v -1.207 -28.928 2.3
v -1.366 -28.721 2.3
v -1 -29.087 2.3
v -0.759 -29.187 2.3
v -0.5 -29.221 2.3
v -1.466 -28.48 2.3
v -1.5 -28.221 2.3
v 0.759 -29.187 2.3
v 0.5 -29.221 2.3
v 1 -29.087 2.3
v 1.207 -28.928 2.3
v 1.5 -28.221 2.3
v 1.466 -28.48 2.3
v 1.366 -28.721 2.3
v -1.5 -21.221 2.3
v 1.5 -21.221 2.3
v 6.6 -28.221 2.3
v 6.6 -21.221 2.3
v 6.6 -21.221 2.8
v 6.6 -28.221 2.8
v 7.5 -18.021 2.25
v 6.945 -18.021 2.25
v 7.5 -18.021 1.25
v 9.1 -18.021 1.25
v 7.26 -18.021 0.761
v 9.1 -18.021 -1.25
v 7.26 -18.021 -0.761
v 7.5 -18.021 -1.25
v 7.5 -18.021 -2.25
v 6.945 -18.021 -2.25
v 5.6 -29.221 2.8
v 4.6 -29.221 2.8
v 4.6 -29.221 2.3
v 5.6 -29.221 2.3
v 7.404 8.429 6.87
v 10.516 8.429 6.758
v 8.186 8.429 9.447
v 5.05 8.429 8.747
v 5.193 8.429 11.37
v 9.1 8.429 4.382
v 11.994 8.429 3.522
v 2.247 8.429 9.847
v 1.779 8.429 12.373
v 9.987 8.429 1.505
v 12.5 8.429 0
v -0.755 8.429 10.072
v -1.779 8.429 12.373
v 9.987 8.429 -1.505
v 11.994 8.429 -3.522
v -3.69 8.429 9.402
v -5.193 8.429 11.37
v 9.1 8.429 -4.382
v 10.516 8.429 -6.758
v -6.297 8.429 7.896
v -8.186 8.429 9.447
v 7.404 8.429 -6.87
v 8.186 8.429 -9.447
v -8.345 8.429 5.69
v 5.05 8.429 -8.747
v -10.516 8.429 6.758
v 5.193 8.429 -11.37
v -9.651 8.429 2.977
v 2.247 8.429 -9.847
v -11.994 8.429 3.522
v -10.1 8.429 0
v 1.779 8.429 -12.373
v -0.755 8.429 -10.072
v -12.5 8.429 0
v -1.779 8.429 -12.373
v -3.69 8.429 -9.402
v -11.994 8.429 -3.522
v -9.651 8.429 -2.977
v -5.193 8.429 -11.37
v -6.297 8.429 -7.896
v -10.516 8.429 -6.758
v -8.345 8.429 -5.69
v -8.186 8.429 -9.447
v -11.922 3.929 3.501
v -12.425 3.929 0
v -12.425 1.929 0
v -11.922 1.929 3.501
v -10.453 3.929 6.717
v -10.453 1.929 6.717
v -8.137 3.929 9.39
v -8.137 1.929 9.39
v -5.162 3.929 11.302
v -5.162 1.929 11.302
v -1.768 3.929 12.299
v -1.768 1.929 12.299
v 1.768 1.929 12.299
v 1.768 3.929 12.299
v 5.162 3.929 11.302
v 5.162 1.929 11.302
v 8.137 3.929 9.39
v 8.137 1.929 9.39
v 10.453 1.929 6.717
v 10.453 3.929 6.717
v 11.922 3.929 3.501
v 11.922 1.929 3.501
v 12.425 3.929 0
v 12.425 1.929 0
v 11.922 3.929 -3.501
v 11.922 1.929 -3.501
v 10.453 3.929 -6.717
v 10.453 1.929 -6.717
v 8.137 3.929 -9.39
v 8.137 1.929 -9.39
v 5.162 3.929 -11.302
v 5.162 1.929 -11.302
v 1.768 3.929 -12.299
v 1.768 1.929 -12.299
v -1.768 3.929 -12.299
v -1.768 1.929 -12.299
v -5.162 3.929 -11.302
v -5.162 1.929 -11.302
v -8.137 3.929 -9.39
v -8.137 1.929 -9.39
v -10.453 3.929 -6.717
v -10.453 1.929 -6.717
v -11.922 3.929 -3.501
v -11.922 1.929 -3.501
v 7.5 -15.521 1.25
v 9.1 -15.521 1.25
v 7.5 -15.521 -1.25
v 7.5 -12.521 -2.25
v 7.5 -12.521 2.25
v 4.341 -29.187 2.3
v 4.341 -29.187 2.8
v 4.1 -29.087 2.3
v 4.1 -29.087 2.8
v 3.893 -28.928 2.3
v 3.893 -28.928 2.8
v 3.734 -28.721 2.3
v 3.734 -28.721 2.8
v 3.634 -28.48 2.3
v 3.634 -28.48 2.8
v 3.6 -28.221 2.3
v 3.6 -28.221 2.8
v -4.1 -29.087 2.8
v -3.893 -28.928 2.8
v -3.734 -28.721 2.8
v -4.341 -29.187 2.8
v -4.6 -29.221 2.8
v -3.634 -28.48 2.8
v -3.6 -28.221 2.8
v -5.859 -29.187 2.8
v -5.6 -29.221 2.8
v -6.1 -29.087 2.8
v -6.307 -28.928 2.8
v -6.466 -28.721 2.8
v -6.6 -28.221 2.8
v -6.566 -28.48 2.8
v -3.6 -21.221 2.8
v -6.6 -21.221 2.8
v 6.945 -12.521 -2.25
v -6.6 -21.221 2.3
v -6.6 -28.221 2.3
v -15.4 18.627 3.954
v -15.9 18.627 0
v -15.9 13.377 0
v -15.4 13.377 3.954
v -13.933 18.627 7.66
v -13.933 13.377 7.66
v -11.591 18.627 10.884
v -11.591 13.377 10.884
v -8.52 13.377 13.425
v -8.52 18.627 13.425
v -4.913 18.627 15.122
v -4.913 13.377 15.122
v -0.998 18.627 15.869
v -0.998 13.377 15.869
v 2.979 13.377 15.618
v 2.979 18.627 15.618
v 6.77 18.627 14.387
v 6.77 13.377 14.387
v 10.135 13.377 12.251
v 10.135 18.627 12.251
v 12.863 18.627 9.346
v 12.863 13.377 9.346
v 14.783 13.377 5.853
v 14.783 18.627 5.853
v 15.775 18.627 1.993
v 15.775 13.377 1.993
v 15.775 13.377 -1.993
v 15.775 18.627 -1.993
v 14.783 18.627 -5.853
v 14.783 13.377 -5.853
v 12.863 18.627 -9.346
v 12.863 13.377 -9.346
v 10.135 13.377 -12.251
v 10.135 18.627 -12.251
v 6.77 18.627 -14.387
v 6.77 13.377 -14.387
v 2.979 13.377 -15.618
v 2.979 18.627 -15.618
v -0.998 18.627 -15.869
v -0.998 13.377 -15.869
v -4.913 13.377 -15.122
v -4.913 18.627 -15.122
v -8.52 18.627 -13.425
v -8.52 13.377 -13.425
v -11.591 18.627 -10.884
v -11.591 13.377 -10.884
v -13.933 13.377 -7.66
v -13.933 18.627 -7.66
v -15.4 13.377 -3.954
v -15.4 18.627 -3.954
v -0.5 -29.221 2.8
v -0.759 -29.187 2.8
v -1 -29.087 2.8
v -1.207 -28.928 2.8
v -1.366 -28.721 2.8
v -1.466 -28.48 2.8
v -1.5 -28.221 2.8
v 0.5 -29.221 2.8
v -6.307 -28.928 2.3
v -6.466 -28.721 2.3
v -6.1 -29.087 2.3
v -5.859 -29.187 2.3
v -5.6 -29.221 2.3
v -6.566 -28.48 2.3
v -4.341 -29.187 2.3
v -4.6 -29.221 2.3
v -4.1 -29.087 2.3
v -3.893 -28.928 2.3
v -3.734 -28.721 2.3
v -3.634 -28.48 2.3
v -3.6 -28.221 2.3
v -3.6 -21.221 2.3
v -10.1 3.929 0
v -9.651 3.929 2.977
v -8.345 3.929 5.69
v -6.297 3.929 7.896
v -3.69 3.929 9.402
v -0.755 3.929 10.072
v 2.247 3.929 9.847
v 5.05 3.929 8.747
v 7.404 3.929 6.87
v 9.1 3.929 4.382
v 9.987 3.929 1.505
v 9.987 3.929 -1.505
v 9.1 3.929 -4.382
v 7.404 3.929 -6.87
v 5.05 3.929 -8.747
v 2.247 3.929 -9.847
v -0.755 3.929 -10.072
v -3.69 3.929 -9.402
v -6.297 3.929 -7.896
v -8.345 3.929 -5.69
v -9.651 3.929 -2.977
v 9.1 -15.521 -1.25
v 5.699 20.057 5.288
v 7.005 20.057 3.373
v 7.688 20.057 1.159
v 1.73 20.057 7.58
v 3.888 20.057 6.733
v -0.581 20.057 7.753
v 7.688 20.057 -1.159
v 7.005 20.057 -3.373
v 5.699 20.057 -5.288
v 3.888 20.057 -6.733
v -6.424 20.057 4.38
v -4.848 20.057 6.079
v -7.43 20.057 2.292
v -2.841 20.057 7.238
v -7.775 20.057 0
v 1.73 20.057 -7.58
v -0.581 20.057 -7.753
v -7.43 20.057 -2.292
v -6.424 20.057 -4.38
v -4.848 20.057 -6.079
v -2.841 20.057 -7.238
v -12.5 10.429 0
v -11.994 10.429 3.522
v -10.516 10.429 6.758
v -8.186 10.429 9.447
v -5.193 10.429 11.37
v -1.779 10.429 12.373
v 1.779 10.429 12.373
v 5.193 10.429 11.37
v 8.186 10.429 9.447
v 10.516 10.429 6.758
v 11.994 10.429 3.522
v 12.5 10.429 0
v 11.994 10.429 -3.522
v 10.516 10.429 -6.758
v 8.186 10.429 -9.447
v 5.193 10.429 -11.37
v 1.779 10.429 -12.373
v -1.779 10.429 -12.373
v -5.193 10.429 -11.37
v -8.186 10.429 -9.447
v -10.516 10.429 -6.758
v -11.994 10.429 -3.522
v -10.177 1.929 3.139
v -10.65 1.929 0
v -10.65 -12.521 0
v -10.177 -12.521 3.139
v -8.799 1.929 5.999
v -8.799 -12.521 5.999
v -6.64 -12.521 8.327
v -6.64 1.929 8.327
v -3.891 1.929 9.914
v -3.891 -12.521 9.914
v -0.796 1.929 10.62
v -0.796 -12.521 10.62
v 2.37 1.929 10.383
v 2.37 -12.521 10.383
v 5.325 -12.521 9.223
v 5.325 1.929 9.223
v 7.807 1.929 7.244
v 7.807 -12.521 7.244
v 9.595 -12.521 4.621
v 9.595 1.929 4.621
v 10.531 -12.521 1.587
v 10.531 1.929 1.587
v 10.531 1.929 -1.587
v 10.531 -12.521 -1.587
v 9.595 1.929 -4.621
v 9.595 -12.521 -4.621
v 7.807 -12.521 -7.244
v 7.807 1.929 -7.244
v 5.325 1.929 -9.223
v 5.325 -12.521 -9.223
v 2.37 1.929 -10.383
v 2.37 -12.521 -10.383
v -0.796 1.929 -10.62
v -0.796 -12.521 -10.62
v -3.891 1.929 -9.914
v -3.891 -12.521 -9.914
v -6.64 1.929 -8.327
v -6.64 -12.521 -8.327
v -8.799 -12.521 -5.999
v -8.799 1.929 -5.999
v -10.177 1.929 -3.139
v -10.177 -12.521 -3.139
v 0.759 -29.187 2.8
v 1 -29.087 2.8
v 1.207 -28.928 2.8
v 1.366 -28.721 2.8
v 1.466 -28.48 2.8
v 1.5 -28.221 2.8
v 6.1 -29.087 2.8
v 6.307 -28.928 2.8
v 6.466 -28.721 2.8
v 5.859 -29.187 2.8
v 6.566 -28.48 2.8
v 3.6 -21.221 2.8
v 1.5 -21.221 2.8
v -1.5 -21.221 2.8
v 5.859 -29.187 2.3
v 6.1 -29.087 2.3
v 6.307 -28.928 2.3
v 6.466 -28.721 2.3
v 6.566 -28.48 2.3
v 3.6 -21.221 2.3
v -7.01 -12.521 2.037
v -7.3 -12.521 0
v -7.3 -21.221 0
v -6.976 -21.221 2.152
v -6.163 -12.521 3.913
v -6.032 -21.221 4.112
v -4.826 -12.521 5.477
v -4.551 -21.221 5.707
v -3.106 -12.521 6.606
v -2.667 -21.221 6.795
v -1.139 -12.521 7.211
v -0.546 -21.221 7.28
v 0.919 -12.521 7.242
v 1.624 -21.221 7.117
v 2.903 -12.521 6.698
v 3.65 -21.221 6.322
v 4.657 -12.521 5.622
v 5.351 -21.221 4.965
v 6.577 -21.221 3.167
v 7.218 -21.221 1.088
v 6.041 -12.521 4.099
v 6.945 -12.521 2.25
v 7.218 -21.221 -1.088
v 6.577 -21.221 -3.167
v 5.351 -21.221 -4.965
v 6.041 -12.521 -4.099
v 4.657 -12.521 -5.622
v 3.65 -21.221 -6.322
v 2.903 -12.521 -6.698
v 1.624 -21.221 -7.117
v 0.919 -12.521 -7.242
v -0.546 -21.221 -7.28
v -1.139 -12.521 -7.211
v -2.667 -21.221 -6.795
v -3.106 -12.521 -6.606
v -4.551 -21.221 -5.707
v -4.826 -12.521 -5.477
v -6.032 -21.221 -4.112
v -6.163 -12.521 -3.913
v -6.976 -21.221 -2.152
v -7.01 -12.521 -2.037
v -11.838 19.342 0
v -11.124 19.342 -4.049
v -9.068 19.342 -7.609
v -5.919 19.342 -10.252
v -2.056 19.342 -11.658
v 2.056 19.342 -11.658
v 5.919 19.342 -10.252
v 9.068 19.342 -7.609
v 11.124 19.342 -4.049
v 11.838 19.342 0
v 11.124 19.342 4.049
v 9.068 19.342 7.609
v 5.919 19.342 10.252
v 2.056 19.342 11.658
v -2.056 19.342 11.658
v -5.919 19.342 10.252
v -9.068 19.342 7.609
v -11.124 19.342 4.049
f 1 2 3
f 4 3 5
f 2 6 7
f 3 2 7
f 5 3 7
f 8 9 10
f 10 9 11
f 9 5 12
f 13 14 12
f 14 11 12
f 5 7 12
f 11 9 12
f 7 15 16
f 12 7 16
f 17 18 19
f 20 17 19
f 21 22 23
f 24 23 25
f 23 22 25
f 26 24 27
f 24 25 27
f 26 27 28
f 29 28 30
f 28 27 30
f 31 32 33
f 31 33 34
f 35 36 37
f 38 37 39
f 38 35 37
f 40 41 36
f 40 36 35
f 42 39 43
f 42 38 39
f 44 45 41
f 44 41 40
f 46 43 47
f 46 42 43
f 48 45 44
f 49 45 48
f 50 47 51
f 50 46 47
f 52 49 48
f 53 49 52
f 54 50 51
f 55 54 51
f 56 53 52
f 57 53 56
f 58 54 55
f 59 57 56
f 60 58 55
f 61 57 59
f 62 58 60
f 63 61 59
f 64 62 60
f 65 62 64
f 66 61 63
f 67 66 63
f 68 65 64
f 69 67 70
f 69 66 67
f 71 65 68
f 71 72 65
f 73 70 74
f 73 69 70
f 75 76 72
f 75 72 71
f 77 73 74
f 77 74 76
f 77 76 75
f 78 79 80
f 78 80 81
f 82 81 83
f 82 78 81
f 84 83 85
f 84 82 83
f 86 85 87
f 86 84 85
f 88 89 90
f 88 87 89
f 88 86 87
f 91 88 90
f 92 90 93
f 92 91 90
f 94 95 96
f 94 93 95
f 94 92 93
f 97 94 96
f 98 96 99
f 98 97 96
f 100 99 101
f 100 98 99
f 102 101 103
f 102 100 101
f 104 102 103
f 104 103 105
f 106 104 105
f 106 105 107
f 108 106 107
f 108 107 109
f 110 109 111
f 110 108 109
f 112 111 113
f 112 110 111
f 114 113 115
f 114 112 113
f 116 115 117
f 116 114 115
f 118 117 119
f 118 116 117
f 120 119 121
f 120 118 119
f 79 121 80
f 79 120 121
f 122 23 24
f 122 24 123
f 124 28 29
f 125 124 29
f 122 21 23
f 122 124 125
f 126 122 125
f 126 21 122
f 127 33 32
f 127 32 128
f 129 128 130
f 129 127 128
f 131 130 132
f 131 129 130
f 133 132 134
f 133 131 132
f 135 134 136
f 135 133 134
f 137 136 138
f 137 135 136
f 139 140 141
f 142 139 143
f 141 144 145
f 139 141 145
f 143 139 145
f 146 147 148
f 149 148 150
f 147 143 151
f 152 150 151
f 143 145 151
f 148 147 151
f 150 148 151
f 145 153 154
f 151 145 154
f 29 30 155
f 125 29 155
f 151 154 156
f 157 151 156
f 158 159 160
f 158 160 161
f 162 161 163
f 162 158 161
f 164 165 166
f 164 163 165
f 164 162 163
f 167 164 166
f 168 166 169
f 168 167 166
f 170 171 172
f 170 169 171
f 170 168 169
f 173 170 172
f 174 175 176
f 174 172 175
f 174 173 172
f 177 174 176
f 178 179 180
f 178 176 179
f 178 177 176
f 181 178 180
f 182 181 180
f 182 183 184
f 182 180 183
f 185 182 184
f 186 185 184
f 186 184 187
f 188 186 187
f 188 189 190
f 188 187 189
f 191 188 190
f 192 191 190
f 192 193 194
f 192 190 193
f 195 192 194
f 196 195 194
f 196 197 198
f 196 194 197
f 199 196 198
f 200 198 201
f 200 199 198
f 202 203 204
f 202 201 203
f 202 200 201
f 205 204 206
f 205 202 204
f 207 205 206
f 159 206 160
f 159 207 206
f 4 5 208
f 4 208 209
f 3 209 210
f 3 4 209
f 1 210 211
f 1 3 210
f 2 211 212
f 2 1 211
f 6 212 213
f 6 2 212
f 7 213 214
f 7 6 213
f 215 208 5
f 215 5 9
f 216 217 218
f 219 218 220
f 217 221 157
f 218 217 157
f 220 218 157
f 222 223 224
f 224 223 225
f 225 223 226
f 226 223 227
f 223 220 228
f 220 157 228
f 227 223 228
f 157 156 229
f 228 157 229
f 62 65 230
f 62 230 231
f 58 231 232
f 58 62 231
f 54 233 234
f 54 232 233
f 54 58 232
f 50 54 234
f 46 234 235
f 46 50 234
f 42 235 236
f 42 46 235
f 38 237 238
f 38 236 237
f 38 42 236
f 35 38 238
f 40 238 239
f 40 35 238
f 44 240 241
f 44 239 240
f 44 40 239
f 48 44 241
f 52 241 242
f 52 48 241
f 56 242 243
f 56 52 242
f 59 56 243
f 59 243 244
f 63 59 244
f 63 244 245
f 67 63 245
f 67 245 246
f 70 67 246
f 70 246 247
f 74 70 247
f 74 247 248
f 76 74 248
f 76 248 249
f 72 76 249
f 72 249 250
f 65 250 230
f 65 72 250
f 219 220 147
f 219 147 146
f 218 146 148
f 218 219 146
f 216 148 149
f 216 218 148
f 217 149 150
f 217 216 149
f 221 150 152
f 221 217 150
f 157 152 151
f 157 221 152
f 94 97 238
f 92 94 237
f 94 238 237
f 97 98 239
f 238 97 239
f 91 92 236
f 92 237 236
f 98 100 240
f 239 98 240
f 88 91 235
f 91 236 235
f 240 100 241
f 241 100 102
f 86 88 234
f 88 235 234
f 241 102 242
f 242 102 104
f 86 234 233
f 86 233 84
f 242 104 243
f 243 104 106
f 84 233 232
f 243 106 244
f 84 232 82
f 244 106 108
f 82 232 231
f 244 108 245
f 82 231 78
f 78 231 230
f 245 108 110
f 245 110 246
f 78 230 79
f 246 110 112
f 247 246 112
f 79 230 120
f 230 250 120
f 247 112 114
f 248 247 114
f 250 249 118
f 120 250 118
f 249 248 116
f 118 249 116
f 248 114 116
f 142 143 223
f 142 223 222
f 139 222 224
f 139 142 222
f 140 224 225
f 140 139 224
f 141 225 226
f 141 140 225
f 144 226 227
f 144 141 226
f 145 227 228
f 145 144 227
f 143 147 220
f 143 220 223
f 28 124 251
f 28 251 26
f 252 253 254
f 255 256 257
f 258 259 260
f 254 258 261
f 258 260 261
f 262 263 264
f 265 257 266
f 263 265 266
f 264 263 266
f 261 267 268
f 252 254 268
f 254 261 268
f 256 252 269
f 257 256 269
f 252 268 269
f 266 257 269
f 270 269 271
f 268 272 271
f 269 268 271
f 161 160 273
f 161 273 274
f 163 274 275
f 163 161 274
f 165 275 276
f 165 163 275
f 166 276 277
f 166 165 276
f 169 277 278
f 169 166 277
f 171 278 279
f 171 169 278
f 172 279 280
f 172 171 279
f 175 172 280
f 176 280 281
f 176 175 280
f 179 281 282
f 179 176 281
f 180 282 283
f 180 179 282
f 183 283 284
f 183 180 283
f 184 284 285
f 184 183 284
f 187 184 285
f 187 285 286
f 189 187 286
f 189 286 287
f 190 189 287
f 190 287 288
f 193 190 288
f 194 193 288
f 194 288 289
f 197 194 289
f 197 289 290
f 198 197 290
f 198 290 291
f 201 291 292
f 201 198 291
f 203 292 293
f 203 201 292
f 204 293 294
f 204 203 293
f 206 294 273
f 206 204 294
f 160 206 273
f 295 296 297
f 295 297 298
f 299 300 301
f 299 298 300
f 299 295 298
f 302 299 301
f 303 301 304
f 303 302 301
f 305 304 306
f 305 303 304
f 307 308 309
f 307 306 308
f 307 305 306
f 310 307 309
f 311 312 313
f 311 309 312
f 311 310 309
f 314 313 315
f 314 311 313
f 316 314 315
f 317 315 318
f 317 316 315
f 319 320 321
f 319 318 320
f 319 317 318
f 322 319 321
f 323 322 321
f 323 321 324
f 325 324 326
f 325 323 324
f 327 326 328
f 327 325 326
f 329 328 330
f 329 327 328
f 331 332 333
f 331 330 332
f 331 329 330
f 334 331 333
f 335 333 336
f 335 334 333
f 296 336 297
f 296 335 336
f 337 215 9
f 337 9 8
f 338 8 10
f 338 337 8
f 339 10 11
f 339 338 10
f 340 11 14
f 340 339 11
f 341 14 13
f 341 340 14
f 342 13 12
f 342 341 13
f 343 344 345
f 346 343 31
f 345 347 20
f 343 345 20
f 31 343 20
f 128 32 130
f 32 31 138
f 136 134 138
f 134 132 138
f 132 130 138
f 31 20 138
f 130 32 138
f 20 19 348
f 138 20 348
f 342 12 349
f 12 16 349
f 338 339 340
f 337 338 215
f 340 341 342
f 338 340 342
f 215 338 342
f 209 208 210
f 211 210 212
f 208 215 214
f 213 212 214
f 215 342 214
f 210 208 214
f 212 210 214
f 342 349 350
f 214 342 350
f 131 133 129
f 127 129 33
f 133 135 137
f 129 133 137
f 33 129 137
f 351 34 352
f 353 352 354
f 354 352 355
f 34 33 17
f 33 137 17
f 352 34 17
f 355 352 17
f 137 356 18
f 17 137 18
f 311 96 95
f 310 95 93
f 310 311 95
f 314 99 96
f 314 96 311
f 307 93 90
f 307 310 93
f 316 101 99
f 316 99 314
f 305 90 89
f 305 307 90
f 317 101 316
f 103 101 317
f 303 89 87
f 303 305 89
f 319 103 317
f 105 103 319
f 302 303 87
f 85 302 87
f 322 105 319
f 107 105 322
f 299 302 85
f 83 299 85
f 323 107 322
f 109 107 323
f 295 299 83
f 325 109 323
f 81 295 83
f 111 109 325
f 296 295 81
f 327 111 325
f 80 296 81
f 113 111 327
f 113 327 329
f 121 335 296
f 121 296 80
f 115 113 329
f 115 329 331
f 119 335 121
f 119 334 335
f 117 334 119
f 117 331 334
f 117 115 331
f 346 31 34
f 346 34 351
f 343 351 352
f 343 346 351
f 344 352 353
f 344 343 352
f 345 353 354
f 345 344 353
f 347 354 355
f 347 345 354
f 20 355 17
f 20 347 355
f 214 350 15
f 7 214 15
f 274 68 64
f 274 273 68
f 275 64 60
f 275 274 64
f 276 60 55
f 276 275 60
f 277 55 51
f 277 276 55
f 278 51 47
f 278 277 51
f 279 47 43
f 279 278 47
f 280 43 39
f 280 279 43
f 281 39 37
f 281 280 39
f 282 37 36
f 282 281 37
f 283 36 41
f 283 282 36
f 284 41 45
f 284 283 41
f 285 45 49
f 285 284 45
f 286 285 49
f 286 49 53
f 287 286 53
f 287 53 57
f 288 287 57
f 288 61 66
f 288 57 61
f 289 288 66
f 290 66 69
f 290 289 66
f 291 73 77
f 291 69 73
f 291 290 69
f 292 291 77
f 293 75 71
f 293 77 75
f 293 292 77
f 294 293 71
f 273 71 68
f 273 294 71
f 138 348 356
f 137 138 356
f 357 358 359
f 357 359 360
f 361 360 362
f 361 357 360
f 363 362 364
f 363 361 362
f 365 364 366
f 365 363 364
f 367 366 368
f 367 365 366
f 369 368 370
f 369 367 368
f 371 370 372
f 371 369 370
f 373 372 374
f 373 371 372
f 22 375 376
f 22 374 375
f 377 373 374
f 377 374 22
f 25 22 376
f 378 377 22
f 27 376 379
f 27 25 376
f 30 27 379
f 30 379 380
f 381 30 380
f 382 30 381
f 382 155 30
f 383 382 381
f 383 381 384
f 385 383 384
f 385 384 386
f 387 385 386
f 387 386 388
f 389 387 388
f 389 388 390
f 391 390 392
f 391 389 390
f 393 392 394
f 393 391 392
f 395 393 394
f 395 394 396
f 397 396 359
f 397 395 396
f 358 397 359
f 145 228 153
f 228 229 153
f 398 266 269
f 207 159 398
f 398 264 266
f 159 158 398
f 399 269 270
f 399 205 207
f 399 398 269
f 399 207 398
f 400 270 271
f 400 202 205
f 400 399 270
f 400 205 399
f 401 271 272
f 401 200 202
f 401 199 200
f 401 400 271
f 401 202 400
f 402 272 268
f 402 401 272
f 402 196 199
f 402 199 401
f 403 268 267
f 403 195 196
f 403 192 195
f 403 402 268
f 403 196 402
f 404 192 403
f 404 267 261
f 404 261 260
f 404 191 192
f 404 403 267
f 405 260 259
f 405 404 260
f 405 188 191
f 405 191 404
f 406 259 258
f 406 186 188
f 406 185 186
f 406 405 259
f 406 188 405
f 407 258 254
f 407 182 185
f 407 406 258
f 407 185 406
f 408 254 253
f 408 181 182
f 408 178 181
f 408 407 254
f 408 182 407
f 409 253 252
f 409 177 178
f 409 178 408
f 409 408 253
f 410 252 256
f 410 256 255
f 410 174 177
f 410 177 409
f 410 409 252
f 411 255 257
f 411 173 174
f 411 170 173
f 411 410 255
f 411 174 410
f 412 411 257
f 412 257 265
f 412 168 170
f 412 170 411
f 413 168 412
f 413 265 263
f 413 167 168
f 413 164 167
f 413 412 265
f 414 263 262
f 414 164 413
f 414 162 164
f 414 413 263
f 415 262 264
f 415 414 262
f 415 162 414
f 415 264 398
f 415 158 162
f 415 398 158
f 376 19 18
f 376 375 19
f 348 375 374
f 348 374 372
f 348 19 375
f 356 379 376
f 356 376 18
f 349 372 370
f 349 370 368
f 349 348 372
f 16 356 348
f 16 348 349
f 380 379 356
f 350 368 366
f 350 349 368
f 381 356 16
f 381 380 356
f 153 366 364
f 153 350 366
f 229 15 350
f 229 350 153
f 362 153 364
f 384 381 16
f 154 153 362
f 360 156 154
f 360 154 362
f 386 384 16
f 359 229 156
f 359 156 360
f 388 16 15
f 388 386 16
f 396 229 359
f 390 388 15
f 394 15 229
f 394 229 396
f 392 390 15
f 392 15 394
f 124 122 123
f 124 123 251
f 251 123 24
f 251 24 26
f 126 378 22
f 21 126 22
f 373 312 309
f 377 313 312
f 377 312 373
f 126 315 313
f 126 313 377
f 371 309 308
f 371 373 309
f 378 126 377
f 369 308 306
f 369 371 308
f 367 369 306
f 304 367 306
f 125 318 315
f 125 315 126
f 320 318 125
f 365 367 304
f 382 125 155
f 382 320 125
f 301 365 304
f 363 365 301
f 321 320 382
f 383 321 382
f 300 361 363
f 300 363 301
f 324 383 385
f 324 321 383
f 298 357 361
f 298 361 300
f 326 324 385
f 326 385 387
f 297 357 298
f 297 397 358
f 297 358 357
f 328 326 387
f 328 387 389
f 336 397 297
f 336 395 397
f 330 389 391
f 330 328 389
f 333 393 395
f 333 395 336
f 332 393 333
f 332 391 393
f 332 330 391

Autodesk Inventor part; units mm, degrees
ref_plane "XZ Plane" through (0, 0, 0) normal (0, 1, 0) x (-1, 0, 0)
ref_plane "XY Plane" through (0, 0, 0) normal (0, 0, 1) x (1, 0, 0)
sketch "Sketch1" plane through (0, 0, 0) normal (0, 0, 1) x (1, 0, 0)
  line L0 (0, 20.0573) -> (0, -21.2213)
  line L1 (0, -21.2213) -> (-7.3, -21.2213)
  line L2 (-7.3, -21.2213) -> (-7.3, -12.5213)
  line L3 (-7.3, -12.5213) -> (-10.65, -12.5213)
  line L4 (-10.65, 1.9287) -> (-12.425, 1.9287)
  line L5 (-12.425, 1.9287) -> (-12.425, 3.9287)
  line L6 (-12.425, 3.9287) -> (-10.1, 3.9287)
  line L7 (-10.1, 3.9287) -> (-10.1, 8.4287)
  line L8 (-10.1, 8.4287) -> (-12.5, 8.4287)
  line L9 (-12.5, 8.4287) -> (-12.5, 10.4287)
  line L10 (-12.5, 10.4287) -> (-15.9, 13.3766)
  line L11 (-15.9, 13.3766) -> (-15.9, 18.6266)
  line L12 (0, 23.9493) -> (0, -31.6262)
  line L13 (-10.65, -12.5213) -> (-10.65, 1.9287)
  line L14 (-15.9, 18.6266) -> (-7.775, 20.0573)
  line L15 (-7.775, 20.0573) -> (0, 20.0573)
  point P0 (0, 0)
  point P1 (-10.1, 6.1787)
  point P2 (-10.65, -5.2963)
  dimension "d2" = 31.8
  dimension "d3" = 25
  dimension "d5" = 20.2
  dimension "d6" = 24.85
  dimension "d9" = 14.6
  dimension "d10" = 8.7
  dimension "d13" = 2
  dimension "d14" = 4.5
  dimension "d15" = 4.5
  dimension "d16" = 2
  dimension "d17" = 5.25
  dimension "d19" = 21.3
  dimension "d20" = 14.45
  dimension "d21" = 15.55
  dimension "d22" = 8.25
revolve "Revolution1" add sketch "Sketch1" angle 360 about axis through (0, 23.9493, 0) along (0, -1, 0)
sketch "Sketch2" plane through (0, -21.2213, 0) normal (0, -1, 0) x (1, 0, 0)
  line L0 (6.6, 2.8) -> (3.6, 2.8)
  line L1 (3.6, 2.8) -> (3.6, 2.3)
  line L2 (3.6, 2.3) -> (6.6, 2.3)
  line L3 (6.6, 2.3) -> (6.6, 2.8)
  line L4 (1.5, 2.8) -> (-1.5, 2.8)
  line L5 (-1.5, 2.8) -> (-1.5, 2.3)
  line L6 (-1.5, 2.3) -> (1.5, 2.3)
  line L7 (1.5, 2.3) -> (1.5, 2.8)
  line L8 (-3.6, 2.8) -> (-6.6, 2.8)
  line L9 (-6.6, 2.8) -> (-6.6, 2.3)
  line L10 (-6.6, 2.3) -> (-3.6, 2.3)
  line L11 (-3.6, 2.3) -> (-3.6, 2.8)
  circle A0 centre (0, 0) radius 7.3 projected
  point P0 (0, 0)
  dimension "d23" = 0.5
  dimension "d24" = 3
  dimension "d25" = 2.1
  dimension "d26" = 2.1
  dimension "d29" = 14.6
  dimension "d31" = 2.8
  dimension "d32" = 1.5
extrude "Extrusion1" add sketch "Sketch2" along normal blind 8 contours L3 L2 L1 L0 | L7 L6 L5 L4 | L11 L10 L9 L8
fillet "Fillet1" radius 1 6 edges at (6.6, -29.2213, 2.55) (3.6, -29.2213, 2.55) (-6.6, -29.2213, 2.55) (-3.6, -29.2213, 2.55) (-1.5, -29.2213, 2.55) (1.5, -29.2213, 2.55)
ref_plane "Work Plane1" through (6, 0, 0) normal (1, 0, 0) x (0, 1, 0)
sketch "Sketch3" plane through (6, 0, 0) normal (1, 0, 0) x (0, 1, 0)
  line L0 (-12.5213, 7.3) -> (-12.5213, -7.3) projected
  line L1 (-12.5213, 2.25) -> (-18.0213, 2.25)
  line L2 (-18.0213, 2.25) -> (-18.0213, -2.25)
  line L3 (-18.0213, -2.25) -> (-12.5213, -2.25)
  line L4 (-12.5213, -2.25) -> (-12.5213, 2.25)
  line L5 (-39.077, 0) -> (29.913, 0) projected
  point P0 (0, 0)
  dimension "d37" = 4.5
  dimension "d38" = 5.5
  dimension "d39" = 2.25
extrude "Extrusion2" add sketch "Sketch3" along normal blind 1.5
sketch "Sketch4" plane through (7.5, 0, 0) normal (1, 0, 0) x (0, 0, -1)
  line L0 (-2.25, -18.0213) -> (2.25, -18.0213) projected
  line L1 (-1.25, -15.5213) -> (1.25, -15.5213)
  line L2 (1.25, -15.5213) -> (1.25, -18.0213)
  line L3 (1.25, -18.0213) -> (-1.25, -18.0213)
  line L4 (-1.25, -18.0213) -> (-1.25, -15.5213)
  line L5 (0, -39.077) -> (0, 29.913) projected
  point P0 (0, 0)
  dimension "d42" = 2.5
  dimension "d43" = 2.5
  dimension "d44" = 1.25
extrude "Extrusion3" add sketch "Sketch4" along normal blind 1.6
equation "\"d32\" = 0.5 * d24"
equation "\"d39\" = 0.5 * d37"
equation "\"d44\" = 0.5 * d43"
properties part number "Co-1-01-eStopButton"
